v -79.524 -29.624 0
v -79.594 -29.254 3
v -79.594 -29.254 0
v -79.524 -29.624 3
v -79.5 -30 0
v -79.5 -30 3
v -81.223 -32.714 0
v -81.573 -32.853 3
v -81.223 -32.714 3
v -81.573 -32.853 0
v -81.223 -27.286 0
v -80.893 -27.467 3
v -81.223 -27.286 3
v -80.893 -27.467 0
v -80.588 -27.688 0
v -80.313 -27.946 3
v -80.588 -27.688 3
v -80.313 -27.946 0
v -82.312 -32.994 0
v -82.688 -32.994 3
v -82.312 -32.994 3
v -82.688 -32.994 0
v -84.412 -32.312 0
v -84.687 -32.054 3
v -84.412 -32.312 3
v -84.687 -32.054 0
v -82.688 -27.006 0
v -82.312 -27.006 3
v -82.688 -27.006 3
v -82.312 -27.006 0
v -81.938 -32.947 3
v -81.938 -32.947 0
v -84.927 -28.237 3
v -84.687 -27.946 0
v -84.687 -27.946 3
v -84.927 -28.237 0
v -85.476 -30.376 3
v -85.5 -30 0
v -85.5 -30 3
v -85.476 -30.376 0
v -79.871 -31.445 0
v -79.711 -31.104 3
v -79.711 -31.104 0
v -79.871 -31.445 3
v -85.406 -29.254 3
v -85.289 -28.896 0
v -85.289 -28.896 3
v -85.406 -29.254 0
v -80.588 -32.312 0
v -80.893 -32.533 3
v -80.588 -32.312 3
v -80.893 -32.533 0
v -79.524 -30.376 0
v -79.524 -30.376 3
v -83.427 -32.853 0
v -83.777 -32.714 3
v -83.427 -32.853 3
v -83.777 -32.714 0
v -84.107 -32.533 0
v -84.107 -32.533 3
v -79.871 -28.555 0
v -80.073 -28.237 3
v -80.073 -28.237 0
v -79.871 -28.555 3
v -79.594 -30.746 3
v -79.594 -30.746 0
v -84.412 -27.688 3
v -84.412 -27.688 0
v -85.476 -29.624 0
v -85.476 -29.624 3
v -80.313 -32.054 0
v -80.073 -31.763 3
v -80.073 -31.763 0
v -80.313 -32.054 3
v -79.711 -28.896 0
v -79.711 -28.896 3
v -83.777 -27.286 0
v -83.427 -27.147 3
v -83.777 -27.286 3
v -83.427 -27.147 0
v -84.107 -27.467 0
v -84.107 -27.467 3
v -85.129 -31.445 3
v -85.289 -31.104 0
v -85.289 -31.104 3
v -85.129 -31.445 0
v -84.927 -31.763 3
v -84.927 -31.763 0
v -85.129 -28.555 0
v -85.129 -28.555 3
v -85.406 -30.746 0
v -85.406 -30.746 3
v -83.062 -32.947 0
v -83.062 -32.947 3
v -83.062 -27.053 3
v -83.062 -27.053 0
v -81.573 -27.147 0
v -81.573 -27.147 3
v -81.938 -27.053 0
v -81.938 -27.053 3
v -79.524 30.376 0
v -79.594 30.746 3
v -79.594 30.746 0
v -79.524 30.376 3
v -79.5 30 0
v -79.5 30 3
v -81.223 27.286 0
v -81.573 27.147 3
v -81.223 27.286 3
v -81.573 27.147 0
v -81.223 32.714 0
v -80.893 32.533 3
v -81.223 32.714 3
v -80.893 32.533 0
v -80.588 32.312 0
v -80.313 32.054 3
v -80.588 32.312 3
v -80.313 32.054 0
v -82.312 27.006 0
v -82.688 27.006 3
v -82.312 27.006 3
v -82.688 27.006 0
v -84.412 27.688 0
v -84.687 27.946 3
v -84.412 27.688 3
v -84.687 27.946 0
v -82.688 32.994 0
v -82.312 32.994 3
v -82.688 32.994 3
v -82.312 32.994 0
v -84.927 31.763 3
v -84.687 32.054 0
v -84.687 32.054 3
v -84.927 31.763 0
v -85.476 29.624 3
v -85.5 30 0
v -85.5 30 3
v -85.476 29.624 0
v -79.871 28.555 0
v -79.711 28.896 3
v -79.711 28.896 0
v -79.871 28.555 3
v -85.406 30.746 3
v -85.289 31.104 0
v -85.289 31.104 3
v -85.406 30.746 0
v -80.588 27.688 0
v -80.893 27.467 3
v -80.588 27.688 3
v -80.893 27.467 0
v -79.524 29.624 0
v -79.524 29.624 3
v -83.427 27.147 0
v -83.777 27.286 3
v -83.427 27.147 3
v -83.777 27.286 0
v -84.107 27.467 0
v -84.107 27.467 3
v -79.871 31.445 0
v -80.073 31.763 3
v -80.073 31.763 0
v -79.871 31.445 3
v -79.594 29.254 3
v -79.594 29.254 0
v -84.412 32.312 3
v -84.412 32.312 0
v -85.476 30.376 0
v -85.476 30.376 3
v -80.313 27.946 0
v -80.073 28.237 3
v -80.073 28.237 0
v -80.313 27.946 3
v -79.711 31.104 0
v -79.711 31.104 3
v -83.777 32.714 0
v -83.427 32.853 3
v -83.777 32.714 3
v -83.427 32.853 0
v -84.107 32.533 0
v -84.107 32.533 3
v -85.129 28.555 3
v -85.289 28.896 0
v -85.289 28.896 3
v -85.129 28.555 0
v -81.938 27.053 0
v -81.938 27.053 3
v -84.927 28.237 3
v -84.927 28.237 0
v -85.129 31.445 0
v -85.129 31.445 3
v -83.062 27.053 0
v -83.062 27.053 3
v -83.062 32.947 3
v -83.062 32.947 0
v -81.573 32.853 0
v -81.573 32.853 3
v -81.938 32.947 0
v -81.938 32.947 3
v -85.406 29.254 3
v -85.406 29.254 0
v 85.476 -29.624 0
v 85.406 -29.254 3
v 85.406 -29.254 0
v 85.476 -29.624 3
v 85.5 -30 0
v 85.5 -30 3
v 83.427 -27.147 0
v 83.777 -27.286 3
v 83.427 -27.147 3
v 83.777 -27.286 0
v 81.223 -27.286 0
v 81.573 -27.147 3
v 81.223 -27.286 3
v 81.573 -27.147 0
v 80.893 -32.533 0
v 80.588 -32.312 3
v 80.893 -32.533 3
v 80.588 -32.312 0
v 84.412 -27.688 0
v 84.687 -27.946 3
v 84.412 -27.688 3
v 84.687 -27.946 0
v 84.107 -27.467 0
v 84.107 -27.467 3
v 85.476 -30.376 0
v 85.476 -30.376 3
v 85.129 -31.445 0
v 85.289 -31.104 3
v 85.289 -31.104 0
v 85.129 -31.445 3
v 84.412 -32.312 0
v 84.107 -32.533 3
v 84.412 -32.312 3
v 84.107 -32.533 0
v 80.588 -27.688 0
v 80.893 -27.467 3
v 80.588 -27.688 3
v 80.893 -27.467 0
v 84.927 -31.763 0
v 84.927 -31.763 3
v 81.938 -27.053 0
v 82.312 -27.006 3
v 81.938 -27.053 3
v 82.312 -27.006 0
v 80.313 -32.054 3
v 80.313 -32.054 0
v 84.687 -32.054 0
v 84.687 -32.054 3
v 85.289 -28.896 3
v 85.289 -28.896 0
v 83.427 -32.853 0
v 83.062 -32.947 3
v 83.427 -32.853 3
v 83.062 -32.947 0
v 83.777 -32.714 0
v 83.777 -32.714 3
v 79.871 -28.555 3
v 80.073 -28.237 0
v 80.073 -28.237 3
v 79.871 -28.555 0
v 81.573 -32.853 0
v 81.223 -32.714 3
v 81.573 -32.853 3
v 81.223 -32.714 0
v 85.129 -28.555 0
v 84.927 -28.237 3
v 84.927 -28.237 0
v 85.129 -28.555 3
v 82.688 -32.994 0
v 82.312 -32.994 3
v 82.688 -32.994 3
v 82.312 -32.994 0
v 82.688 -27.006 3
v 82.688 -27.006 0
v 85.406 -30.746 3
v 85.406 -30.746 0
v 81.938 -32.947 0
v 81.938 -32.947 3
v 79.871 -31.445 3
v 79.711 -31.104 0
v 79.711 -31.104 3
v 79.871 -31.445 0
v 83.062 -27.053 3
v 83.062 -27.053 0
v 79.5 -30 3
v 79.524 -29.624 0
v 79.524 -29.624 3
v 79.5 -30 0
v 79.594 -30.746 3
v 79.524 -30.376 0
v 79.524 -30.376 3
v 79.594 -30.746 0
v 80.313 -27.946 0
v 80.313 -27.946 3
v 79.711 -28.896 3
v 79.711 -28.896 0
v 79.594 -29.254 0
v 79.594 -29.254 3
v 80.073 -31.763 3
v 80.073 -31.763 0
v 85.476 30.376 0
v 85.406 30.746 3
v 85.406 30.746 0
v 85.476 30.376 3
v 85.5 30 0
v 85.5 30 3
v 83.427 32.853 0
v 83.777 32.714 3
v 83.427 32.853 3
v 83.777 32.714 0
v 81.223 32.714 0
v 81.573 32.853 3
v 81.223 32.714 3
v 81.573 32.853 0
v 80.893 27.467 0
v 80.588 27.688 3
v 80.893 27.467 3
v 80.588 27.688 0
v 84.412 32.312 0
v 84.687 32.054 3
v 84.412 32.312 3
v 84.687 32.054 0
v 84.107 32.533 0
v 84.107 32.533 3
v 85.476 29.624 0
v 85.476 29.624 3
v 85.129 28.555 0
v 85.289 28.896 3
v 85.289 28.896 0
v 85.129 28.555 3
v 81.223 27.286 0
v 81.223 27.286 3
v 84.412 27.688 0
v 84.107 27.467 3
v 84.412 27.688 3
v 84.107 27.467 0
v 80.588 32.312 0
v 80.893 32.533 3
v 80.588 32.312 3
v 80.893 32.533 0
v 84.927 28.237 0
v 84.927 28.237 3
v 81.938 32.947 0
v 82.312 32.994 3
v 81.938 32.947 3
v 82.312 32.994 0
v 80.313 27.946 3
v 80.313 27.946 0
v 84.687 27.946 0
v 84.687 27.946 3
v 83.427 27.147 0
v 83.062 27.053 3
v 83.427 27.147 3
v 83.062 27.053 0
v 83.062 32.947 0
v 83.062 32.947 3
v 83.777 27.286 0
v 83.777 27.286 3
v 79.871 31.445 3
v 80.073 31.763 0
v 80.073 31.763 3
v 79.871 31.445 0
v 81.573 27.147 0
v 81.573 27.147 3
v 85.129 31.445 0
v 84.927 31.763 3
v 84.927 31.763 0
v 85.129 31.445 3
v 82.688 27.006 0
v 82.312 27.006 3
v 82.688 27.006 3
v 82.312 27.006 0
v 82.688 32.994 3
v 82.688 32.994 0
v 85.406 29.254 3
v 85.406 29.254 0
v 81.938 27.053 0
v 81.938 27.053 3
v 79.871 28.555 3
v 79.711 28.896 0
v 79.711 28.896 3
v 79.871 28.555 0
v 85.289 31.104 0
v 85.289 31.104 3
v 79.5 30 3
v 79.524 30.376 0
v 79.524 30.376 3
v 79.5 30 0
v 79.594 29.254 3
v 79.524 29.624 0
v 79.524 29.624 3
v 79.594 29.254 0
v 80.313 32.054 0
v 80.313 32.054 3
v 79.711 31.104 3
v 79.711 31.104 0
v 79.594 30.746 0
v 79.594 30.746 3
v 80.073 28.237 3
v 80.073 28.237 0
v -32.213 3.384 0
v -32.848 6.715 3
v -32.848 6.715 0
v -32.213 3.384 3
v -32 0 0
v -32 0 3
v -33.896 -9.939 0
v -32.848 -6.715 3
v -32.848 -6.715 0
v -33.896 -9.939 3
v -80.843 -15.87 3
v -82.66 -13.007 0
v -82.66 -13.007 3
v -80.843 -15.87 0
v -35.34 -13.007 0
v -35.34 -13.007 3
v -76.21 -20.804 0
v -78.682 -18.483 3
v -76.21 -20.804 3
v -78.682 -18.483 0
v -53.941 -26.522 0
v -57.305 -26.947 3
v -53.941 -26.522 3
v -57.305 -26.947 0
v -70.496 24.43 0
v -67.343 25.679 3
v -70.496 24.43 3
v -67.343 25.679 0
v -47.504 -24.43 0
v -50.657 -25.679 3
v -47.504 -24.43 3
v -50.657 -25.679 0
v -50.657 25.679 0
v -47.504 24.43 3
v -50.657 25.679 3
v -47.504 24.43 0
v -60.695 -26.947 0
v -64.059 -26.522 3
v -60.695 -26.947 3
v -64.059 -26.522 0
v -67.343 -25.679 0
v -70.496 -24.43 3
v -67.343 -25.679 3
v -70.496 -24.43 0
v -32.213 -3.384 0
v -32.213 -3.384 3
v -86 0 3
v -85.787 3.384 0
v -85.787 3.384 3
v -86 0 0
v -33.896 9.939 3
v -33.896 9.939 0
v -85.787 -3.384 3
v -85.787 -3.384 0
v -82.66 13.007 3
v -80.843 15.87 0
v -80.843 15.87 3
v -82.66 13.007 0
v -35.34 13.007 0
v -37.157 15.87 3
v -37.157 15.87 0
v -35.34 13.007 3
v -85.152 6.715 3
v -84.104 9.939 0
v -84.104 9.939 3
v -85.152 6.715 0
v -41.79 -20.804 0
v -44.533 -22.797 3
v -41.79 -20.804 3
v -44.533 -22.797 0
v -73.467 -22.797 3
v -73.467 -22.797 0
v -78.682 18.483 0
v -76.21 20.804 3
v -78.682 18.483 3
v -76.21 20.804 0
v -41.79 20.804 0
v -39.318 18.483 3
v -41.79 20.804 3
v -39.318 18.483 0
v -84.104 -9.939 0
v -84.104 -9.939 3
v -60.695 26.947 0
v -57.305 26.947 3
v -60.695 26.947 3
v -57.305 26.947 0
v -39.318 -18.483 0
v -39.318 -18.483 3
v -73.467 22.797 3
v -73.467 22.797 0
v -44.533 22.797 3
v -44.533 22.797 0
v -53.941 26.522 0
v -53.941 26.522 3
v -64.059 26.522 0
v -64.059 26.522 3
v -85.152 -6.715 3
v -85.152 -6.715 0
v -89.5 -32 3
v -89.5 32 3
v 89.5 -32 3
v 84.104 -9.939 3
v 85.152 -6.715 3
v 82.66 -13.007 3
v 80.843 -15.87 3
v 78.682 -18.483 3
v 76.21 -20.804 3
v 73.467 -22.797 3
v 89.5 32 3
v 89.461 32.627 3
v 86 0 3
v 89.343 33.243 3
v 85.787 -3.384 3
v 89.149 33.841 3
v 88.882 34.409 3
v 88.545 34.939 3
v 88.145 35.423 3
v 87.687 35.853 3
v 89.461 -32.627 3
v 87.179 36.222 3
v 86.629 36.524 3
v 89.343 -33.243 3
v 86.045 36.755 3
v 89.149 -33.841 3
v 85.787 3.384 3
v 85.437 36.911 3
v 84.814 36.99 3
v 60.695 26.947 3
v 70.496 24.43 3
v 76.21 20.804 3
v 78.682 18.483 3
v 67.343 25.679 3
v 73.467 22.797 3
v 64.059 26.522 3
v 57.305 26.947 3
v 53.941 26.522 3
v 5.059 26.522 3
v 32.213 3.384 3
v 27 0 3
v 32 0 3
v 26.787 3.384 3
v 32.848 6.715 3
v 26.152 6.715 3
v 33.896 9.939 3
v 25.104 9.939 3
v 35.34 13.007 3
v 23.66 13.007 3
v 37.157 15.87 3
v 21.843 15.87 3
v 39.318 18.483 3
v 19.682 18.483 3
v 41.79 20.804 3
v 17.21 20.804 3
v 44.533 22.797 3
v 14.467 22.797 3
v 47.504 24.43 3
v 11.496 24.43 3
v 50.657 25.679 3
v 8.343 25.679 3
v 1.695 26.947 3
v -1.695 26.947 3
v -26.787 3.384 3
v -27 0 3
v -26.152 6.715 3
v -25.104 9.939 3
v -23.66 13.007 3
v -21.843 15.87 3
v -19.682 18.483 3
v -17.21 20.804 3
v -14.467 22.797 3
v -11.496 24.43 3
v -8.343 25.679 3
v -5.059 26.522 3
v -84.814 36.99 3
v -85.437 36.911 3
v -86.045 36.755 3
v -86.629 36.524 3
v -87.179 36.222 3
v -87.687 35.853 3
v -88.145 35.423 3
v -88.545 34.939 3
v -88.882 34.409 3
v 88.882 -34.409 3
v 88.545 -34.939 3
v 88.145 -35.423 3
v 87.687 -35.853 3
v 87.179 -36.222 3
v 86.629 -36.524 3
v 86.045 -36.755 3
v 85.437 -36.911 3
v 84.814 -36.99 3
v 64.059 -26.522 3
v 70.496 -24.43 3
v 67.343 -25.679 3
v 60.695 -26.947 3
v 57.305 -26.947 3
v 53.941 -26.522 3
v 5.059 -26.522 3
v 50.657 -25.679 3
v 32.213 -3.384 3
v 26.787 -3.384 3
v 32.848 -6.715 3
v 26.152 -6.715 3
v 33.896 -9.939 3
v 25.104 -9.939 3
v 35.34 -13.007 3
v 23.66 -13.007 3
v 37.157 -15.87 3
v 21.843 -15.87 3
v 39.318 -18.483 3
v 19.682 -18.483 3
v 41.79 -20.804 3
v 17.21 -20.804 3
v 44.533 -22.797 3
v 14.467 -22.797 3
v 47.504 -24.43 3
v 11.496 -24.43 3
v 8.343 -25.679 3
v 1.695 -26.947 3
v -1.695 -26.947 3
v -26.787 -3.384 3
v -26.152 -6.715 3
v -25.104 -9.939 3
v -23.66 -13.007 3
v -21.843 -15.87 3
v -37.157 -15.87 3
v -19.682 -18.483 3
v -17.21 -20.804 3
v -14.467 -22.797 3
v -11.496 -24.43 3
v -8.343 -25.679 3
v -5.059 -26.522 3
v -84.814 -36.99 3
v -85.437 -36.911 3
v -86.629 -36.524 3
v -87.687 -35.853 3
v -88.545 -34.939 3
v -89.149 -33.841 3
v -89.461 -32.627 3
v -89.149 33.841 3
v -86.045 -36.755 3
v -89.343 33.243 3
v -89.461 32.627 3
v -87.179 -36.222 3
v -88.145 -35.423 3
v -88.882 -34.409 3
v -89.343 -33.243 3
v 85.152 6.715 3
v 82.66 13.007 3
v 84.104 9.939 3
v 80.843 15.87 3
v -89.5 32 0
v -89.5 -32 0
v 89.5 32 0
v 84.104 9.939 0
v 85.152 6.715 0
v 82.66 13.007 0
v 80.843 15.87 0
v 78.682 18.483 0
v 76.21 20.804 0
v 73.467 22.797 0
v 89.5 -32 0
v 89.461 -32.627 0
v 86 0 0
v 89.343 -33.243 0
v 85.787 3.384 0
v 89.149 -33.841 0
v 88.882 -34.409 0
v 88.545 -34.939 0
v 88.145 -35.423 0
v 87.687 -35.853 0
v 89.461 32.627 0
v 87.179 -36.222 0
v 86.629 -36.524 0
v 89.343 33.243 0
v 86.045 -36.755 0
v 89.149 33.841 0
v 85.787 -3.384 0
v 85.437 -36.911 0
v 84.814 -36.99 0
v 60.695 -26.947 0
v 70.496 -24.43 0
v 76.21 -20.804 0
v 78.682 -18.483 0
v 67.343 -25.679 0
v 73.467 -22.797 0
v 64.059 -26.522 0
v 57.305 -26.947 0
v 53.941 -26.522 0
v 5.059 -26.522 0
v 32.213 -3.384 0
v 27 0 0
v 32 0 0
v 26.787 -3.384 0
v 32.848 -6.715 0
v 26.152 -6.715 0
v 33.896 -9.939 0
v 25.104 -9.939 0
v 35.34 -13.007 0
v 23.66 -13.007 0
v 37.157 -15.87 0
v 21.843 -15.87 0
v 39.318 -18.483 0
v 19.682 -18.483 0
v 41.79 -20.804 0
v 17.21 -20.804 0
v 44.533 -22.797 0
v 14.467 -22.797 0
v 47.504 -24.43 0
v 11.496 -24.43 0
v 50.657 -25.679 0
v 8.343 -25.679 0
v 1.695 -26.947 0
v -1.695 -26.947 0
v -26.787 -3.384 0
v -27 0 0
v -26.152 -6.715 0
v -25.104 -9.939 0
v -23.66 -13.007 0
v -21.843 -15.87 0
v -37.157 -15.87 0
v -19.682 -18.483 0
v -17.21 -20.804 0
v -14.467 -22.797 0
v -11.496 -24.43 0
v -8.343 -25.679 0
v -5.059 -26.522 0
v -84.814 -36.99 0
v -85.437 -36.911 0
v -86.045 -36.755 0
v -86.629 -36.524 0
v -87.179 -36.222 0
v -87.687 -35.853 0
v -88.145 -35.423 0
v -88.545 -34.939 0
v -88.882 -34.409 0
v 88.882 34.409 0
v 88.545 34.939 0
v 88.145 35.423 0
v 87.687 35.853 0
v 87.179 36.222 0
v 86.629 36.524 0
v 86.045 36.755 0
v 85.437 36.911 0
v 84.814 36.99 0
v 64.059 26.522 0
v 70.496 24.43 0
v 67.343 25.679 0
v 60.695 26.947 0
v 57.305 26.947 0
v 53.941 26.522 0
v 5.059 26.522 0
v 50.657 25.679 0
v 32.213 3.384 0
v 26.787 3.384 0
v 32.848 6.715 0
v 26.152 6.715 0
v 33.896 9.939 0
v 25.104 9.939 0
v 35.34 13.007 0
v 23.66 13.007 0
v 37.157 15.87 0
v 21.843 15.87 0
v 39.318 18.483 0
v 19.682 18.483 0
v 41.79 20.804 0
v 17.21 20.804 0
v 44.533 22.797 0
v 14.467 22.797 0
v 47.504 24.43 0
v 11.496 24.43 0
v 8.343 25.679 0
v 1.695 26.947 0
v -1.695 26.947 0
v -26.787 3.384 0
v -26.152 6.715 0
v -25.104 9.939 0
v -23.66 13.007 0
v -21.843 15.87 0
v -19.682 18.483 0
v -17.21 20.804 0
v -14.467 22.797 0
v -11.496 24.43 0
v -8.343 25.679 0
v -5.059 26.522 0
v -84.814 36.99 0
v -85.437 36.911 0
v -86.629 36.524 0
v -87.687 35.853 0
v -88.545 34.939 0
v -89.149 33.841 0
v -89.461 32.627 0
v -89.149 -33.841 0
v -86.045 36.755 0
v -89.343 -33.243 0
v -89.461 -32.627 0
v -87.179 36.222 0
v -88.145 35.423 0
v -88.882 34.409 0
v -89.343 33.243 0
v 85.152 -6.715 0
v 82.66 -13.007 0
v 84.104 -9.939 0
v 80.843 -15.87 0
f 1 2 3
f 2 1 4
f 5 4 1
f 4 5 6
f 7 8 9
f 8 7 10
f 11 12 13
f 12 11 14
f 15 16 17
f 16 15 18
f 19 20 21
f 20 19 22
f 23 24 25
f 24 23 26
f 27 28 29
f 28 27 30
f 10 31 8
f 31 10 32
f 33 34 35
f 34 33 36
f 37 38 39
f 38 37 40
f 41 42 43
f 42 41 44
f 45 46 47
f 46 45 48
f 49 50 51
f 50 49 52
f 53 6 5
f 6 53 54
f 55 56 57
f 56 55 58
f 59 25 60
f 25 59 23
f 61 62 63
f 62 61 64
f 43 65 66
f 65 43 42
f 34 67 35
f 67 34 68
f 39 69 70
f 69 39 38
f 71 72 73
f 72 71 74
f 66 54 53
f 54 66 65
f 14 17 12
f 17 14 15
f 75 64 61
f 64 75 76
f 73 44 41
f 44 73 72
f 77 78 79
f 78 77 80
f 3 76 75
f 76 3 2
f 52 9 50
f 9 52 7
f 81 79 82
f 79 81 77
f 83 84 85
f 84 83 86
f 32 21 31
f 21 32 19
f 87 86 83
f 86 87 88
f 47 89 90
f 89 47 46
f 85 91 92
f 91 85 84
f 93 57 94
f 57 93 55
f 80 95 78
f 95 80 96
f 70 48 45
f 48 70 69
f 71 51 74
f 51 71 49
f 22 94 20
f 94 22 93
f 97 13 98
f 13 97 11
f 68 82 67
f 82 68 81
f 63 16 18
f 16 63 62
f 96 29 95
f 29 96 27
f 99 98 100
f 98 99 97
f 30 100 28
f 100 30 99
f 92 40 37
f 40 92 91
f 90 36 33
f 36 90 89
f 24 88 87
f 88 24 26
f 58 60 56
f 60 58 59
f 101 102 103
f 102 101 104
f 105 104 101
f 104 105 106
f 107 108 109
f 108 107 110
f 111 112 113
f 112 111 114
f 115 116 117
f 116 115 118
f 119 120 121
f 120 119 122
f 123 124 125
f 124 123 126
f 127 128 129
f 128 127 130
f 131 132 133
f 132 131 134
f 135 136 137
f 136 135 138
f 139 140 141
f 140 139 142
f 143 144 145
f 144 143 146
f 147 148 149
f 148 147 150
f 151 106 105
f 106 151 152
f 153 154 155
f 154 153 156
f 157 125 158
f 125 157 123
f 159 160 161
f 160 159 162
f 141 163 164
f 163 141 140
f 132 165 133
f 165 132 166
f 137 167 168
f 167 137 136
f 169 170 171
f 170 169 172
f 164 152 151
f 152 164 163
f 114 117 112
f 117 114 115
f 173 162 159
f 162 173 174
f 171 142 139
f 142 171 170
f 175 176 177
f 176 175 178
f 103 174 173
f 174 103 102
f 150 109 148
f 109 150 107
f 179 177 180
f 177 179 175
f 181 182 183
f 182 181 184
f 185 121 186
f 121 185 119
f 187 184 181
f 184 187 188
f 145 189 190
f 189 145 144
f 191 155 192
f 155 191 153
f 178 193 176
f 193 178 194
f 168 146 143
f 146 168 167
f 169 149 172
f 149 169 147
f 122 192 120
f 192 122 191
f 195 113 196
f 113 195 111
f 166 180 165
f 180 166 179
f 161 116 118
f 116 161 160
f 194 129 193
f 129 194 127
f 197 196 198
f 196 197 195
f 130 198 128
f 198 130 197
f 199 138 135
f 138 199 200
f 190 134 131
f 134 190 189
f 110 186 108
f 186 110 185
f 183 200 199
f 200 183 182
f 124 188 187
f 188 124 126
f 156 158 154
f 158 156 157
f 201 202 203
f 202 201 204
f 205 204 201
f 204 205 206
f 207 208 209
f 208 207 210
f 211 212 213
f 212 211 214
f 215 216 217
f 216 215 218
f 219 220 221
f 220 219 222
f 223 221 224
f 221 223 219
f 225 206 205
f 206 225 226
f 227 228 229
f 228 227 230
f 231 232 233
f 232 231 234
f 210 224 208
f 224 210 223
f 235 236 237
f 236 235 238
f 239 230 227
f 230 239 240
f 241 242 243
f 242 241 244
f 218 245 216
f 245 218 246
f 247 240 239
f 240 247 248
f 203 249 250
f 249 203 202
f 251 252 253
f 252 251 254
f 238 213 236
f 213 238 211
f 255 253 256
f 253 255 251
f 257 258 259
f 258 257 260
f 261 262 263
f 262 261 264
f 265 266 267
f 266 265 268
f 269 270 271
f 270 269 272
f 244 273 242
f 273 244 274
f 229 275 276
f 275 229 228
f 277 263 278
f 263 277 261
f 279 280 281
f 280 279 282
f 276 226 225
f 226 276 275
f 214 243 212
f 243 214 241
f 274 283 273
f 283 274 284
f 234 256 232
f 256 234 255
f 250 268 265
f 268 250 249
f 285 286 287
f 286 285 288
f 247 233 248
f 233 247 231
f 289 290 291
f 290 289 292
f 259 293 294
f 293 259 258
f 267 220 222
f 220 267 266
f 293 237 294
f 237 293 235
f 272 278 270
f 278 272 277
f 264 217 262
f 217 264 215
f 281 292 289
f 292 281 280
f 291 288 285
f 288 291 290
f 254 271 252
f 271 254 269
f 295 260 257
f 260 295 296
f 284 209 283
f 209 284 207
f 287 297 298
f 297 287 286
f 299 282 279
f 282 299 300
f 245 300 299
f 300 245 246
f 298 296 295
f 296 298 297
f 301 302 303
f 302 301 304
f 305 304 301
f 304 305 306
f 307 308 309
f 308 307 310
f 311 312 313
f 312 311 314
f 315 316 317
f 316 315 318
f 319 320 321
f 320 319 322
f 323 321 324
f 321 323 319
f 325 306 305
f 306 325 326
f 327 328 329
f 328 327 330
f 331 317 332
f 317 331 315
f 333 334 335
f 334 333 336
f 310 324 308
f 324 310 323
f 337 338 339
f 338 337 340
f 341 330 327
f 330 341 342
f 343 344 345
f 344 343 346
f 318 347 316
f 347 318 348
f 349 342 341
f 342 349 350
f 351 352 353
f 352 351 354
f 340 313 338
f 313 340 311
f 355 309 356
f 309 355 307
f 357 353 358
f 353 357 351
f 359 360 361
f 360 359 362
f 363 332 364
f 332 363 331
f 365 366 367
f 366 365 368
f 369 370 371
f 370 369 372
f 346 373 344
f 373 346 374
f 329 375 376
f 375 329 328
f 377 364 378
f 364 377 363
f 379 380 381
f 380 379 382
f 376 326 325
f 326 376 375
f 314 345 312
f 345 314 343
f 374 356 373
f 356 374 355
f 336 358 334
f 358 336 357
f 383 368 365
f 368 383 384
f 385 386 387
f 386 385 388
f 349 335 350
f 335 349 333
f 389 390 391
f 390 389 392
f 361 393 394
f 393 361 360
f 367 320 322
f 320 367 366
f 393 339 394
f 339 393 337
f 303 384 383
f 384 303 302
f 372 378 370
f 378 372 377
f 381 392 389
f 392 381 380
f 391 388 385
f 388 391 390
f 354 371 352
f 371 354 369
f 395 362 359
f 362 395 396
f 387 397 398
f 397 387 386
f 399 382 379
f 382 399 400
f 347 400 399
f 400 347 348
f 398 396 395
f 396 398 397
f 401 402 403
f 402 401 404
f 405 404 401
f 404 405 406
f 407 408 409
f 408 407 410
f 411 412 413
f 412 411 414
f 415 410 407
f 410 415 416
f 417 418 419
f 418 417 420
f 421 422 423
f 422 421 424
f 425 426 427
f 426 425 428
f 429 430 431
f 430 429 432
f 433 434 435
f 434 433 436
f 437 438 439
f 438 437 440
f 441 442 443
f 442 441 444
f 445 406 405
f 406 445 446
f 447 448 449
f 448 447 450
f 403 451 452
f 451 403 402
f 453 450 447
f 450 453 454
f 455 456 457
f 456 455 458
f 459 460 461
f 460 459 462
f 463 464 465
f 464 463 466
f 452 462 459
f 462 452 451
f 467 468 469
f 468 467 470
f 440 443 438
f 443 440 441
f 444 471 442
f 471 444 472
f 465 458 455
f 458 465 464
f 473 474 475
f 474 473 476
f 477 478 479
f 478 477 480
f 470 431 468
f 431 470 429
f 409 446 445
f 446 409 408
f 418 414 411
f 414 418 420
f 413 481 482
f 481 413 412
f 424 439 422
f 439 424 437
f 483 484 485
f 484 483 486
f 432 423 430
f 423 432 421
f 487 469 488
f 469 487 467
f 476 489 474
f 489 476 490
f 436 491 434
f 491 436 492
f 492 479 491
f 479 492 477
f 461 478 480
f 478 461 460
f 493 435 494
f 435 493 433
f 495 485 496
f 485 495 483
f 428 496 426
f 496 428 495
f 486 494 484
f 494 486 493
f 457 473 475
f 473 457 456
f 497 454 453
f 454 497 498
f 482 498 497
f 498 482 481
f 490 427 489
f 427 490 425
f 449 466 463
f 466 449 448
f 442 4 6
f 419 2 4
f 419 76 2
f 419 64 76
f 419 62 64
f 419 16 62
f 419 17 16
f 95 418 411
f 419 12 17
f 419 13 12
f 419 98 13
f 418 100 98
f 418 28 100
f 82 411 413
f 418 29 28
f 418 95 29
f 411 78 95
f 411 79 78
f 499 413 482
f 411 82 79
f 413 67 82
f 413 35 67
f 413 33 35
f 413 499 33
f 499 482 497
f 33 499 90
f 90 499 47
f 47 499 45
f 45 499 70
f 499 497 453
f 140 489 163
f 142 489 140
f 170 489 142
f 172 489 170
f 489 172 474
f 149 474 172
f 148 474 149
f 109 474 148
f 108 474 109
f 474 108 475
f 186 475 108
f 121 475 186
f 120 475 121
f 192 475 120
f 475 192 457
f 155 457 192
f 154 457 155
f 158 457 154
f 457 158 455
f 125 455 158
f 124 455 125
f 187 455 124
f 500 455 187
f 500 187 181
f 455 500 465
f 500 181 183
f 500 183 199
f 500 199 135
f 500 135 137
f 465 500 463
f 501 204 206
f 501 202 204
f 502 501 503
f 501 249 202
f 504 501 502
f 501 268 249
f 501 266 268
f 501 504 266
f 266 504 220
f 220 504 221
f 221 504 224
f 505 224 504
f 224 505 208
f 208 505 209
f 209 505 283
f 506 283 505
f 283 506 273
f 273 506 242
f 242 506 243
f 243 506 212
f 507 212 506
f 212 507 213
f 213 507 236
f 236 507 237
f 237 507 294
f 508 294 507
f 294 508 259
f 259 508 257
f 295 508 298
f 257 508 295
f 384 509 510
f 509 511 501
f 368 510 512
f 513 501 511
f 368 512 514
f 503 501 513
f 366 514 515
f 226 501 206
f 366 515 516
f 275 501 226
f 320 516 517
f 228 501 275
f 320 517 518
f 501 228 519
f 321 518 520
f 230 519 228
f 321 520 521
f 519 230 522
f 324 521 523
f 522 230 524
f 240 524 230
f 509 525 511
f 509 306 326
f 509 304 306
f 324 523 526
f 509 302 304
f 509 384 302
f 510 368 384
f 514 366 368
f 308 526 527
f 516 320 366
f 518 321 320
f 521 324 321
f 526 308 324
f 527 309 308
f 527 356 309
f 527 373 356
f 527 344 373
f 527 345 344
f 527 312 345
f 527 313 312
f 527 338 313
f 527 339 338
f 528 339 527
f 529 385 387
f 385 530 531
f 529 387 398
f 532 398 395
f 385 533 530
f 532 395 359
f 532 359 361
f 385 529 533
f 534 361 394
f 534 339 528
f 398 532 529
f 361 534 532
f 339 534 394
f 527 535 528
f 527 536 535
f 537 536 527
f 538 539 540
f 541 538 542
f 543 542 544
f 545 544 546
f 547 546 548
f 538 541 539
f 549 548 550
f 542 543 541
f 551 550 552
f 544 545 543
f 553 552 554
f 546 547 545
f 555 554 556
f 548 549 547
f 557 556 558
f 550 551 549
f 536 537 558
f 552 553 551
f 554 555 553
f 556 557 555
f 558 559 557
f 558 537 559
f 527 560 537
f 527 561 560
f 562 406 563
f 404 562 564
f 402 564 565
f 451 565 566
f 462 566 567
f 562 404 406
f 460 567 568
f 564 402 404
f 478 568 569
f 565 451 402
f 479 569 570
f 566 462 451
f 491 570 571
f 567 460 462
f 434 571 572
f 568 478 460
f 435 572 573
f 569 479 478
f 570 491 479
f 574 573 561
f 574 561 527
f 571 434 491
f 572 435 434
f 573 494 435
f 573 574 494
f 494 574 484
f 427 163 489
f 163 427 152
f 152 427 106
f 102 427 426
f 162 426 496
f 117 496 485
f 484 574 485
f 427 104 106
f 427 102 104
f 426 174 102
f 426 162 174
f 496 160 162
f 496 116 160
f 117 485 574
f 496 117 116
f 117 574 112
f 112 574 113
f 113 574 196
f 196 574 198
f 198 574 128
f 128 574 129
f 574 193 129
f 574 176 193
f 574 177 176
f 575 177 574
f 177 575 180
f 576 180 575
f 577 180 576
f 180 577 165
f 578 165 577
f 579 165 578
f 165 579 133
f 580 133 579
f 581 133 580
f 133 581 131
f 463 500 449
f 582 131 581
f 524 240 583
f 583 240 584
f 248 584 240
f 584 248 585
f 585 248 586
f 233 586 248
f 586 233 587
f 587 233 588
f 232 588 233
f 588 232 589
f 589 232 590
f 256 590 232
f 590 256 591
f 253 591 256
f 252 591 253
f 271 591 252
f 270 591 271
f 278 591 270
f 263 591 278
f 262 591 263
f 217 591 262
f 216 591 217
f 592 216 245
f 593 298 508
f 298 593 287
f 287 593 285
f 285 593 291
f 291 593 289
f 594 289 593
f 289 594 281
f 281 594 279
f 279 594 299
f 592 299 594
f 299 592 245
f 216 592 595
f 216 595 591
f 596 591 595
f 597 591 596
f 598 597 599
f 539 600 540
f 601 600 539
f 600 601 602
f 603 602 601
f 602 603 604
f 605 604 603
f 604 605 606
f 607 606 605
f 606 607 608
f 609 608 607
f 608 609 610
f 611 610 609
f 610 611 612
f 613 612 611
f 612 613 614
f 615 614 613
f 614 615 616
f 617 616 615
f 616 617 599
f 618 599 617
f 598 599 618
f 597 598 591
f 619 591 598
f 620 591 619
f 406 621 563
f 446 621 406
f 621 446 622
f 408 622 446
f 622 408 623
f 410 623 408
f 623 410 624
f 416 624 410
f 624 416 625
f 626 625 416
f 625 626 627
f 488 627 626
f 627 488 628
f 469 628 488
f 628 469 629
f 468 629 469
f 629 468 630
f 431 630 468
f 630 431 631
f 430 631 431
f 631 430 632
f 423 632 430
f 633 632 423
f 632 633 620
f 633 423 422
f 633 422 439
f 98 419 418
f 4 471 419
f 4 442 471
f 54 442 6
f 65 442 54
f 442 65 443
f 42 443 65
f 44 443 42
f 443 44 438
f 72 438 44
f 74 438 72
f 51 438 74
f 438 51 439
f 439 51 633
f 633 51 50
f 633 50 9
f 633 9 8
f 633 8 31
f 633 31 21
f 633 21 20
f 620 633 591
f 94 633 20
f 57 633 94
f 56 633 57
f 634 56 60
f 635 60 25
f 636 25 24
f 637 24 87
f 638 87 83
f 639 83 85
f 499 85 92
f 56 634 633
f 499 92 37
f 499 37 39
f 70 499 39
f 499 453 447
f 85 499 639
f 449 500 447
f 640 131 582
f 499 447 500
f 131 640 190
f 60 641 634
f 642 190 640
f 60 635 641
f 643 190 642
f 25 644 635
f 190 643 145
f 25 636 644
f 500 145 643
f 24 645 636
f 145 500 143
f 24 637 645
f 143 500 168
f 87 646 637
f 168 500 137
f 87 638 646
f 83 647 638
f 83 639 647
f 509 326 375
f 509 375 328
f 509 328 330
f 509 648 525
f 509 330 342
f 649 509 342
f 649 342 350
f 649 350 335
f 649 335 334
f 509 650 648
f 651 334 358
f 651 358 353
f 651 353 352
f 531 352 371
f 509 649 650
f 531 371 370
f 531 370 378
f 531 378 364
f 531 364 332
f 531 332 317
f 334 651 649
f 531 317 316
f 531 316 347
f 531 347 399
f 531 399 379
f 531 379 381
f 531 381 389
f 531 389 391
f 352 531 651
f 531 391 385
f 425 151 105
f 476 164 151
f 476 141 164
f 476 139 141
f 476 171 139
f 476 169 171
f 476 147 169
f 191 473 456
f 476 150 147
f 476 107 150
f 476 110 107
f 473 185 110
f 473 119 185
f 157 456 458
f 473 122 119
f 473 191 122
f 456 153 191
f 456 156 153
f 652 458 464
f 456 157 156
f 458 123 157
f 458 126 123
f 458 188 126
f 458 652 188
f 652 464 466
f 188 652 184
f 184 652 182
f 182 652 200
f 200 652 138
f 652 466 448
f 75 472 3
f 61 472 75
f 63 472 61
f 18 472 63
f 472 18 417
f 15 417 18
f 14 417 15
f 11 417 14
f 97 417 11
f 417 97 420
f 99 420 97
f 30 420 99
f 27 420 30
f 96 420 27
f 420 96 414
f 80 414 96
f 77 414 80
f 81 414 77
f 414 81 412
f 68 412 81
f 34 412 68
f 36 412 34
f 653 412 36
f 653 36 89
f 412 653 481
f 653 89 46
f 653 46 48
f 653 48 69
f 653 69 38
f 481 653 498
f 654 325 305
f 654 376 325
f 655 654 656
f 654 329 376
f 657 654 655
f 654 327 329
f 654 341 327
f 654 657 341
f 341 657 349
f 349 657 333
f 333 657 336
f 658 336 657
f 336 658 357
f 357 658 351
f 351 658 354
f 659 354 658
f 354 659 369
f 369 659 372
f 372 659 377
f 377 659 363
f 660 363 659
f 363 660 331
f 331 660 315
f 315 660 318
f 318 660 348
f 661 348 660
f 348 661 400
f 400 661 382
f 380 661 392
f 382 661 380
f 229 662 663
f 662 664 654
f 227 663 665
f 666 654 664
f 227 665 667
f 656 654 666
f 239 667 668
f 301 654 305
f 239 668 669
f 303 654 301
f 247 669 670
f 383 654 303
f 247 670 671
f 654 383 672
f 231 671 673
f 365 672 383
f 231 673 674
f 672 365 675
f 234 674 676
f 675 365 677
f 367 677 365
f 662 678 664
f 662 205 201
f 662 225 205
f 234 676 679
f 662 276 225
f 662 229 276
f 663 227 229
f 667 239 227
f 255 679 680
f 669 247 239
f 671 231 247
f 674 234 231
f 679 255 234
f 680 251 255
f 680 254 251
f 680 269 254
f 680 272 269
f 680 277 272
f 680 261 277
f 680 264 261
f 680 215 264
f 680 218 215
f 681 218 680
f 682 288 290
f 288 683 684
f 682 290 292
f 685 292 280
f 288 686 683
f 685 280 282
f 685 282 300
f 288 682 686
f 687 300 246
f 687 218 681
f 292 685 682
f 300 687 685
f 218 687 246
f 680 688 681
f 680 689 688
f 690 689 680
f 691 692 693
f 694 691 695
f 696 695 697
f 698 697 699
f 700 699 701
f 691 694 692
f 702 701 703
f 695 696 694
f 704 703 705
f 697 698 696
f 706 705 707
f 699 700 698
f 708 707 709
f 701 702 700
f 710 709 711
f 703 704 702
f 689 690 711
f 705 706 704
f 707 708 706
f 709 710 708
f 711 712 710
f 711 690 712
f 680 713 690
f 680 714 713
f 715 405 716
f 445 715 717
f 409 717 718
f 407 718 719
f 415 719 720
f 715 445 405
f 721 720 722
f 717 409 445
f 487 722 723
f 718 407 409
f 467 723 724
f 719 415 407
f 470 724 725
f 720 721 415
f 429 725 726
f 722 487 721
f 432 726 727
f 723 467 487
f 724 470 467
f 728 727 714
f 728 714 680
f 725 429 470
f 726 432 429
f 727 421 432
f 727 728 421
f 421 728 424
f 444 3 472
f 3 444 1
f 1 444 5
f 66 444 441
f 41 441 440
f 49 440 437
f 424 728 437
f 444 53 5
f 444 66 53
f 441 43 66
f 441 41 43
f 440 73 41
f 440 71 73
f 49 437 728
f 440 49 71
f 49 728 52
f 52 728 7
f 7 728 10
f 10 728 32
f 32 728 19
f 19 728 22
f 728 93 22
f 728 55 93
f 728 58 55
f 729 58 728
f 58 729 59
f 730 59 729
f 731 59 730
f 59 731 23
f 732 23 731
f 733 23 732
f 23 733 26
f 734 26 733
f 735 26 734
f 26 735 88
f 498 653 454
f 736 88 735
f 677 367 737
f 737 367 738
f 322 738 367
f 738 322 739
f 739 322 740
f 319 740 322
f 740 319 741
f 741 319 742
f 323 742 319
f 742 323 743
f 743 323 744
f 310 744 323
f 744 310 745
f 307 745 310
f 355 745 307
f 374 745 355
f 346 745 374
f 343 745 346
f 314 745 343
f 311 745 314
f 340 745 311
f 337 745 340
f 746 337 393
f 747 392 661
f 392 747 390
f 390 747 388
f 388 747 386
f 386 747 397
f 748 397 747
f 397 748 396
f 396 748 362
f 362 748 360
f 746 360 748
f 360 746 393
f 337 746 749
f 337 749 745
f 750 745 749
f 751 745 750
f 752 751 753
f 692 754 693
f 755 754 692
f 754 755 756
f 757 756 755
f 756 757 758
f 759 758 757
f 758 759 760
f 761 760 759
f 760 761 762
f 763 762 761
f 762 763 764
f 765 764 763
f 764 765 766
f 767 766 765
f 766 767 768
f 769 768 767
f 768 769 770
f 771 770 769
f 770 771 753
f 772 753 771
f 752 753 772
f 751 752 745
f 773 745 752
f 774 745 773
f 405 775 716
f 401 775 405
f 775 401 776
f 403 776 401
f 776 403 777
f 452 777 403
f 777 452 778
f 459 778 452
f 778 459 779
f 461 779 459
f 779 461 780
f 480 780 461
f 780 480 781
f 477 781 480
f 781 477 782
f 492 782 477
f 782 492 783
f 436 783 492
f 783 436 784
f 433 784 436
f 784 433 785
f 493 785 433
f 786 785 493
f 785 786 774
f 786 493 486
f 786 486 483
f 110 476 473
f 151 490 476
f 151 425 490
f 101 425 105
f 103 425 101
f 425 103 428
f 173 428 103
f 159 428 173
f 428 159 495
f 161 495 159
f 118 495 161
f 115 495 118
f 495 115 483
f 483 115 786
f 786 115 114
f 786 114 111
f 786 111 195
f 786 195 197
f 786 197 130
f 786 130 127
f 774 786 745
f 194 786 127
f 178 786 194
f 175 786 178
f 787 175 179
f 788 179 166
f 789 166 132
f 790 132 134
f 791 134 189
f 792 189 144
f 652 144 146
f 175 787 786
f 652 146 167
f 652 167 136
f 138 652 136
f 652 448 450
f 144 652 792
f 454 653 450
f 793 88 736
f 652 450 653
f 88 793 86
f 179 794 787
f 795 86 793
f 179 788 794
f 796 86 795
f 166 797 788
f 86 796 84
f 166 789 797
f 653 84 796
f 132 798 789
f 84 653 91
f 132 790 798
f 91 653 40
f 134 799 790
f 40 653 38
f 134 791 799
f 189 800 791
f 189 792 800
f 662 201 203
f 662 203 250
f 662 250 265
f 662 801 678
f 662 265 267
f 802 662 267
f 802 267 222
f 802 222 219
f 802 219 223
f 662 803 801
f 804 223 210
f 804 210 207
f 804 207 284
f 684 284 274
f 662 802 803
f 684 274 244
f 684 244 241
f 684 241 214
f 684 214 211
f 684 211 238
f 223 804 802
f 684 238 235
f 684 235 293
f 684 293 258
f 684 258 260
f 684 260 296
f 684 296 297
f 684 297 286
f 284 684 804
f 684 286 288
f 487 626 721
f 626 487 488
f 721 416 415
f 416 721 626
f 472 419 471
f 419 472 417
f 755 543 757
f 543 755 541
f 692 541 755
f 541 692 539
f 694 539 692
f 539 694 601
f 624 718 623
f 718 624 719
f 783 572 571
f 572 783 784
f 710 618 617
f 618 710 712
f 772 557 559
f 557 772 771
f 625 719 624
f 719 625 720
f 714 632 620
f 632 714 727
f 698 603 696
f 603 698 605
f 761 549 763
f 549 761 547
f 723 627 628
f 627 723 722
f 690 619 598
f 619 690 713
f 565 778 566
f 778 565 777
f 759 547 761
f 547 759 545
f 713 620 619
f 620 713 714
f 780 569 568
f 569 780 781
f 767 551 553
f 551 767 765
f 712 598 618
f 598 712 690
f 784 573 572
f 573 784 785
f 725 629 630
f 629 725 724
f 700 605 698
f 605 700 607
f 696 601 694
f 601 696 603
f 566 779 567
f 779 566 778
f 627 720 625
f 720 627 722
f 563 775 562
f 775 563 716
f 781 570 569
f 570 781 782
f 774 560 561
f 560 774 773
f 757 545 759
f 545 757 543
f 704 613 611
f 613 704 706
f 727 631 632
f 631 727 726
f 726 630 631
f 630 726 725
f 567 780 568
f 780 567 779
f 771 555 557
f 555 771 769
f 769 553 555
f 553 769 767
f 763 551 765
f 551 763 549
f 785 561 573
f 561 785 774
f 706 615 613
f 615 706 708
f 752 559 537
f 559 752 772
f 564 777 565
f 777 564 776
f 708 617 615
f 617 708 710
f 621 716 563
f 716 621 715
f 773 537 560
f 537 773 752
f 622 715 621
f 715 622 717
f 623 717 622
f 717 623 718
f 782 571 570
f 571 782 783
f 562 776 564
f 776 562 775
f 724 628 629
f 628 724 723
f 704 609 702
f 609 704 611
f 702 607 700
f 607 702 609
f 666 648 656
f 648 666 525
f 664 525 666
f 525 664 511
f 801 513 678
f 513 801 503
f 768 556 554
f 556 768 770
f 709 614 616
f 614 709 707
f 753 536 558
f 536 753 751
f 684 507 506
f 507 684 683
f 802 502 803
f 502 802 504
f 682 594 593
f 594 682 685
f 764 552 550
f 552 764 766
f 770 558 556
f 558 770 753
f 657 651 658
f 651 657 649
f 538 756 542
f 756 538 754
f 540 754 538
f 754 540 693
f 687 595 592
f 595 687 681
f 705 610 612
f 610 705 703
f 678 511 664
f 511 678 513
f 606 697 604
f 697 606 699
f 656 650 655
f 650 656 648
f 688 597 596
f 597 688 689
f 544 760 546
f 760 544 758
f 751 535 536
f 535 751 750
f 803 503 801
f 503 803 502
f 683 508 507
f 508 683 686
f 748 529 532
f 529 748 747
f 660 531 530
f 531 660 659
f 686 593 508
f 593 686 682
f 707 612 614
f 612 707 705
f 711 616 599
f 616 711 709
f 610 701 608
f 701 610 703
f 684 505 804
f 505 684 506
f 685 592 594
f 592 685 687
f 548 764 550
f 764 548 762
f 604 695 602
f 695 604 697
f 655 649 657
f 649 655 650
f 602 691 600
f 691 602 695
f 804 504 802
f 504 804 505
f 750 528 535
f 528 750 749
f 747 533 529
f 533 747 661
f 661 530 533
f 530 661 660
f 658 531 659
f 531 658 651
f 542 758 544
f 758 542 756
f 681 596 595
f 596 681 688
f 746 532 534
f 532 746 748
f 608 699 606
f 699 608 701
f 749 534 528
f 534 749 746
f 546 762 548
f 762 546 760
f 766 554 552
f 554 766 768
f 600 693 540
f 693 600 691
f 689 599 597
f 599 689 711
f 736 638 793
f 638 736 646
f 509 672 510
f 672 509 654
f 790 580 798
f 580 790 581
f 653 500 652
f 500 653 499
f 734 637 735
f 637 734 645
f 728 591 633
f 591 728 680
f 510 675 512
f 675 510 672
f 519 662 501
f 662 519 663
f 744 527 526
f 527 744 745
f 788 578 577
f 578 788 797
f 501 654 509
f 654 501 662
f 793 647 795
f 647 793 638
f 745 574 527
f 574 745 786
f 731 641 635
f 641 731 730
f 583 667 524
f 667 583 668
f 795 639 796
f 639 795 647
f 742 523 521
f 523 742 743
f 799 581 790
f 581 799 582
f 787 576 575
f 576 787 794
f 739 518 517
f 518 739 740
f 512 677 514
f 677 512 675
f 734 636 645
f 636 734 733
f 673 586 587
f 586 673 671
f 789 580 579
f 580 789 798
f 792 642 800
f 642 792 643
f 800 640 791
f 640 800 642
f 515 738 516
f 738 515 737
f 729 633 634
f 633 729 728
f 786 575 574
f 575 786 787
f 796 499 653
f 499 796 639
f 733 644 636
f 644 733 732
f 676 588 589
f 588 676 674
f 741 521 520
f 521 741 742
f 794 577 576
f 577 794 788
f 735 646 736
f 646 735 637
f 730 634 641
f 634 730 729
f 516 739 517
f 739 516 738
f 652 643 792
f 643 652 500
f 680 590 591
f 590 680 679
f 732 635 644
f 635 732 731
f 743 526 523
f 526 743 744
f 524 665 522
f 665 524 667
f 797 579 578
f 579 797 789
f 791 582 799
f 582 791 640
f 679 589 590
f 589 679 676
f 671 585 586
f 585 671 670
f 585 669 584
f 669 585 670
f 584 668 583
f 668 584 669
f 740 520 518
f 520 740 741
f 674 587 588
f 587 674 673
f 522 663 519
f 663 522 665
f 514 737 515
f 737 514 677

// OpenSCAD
$fn = 50;


difference() {
	union() {
		hull() {
			translate(v = [-84.5000000000, 32.0000000000, 0]) {
				cylinder(h = 3, r = 5);
			}
			translate(v = [84.5000000000, 32.0000000000, 0]) {
				cylinder(h = 3, r = 5);
			}
			translate(v = [-84.5000000000, -32.0000000000, 0]) {
				cylinder(h = 3, r = 5);
			}
			translate(v = [84.5000000000, -32.0000000000, 0]) {
				cylinder(h = 3, r = 5);
			}
		}
	}
	union() {
		#translate(v = [-82.5000000000, -30.0000000000, -100.0000000000]) {
			cylinder(h = 200, r = 3.0000000000);
		}
		#translate(v = [-82.5000000000, 30.0000000000, -100.0000000000]) {
			cylinder(h = 200, r = 3.0000000000);
		}
		#translate(v = [82.5000000000, -30.0000000000, -100.0000000000]) {
			cylinder(h = 200, r = 3.0000000000);
		}
		#translate(v = [82.5000000000, 30.0000000000, -100.0000000000]) {
			cylinder(h = 200, r = 3.0000000000);
		}
		#translate(v = [-59.0000000000, 0, 0]) {
			cylinder(h = 3, r = 27.0000000000);
		}
		#cylinder(h = 3, r = 27.0000000000);
		#translate(v = [59.0000000000, 0, 0]) {
			cylinder(h = 3, r = 27.0000000000);
		}
	}
}
